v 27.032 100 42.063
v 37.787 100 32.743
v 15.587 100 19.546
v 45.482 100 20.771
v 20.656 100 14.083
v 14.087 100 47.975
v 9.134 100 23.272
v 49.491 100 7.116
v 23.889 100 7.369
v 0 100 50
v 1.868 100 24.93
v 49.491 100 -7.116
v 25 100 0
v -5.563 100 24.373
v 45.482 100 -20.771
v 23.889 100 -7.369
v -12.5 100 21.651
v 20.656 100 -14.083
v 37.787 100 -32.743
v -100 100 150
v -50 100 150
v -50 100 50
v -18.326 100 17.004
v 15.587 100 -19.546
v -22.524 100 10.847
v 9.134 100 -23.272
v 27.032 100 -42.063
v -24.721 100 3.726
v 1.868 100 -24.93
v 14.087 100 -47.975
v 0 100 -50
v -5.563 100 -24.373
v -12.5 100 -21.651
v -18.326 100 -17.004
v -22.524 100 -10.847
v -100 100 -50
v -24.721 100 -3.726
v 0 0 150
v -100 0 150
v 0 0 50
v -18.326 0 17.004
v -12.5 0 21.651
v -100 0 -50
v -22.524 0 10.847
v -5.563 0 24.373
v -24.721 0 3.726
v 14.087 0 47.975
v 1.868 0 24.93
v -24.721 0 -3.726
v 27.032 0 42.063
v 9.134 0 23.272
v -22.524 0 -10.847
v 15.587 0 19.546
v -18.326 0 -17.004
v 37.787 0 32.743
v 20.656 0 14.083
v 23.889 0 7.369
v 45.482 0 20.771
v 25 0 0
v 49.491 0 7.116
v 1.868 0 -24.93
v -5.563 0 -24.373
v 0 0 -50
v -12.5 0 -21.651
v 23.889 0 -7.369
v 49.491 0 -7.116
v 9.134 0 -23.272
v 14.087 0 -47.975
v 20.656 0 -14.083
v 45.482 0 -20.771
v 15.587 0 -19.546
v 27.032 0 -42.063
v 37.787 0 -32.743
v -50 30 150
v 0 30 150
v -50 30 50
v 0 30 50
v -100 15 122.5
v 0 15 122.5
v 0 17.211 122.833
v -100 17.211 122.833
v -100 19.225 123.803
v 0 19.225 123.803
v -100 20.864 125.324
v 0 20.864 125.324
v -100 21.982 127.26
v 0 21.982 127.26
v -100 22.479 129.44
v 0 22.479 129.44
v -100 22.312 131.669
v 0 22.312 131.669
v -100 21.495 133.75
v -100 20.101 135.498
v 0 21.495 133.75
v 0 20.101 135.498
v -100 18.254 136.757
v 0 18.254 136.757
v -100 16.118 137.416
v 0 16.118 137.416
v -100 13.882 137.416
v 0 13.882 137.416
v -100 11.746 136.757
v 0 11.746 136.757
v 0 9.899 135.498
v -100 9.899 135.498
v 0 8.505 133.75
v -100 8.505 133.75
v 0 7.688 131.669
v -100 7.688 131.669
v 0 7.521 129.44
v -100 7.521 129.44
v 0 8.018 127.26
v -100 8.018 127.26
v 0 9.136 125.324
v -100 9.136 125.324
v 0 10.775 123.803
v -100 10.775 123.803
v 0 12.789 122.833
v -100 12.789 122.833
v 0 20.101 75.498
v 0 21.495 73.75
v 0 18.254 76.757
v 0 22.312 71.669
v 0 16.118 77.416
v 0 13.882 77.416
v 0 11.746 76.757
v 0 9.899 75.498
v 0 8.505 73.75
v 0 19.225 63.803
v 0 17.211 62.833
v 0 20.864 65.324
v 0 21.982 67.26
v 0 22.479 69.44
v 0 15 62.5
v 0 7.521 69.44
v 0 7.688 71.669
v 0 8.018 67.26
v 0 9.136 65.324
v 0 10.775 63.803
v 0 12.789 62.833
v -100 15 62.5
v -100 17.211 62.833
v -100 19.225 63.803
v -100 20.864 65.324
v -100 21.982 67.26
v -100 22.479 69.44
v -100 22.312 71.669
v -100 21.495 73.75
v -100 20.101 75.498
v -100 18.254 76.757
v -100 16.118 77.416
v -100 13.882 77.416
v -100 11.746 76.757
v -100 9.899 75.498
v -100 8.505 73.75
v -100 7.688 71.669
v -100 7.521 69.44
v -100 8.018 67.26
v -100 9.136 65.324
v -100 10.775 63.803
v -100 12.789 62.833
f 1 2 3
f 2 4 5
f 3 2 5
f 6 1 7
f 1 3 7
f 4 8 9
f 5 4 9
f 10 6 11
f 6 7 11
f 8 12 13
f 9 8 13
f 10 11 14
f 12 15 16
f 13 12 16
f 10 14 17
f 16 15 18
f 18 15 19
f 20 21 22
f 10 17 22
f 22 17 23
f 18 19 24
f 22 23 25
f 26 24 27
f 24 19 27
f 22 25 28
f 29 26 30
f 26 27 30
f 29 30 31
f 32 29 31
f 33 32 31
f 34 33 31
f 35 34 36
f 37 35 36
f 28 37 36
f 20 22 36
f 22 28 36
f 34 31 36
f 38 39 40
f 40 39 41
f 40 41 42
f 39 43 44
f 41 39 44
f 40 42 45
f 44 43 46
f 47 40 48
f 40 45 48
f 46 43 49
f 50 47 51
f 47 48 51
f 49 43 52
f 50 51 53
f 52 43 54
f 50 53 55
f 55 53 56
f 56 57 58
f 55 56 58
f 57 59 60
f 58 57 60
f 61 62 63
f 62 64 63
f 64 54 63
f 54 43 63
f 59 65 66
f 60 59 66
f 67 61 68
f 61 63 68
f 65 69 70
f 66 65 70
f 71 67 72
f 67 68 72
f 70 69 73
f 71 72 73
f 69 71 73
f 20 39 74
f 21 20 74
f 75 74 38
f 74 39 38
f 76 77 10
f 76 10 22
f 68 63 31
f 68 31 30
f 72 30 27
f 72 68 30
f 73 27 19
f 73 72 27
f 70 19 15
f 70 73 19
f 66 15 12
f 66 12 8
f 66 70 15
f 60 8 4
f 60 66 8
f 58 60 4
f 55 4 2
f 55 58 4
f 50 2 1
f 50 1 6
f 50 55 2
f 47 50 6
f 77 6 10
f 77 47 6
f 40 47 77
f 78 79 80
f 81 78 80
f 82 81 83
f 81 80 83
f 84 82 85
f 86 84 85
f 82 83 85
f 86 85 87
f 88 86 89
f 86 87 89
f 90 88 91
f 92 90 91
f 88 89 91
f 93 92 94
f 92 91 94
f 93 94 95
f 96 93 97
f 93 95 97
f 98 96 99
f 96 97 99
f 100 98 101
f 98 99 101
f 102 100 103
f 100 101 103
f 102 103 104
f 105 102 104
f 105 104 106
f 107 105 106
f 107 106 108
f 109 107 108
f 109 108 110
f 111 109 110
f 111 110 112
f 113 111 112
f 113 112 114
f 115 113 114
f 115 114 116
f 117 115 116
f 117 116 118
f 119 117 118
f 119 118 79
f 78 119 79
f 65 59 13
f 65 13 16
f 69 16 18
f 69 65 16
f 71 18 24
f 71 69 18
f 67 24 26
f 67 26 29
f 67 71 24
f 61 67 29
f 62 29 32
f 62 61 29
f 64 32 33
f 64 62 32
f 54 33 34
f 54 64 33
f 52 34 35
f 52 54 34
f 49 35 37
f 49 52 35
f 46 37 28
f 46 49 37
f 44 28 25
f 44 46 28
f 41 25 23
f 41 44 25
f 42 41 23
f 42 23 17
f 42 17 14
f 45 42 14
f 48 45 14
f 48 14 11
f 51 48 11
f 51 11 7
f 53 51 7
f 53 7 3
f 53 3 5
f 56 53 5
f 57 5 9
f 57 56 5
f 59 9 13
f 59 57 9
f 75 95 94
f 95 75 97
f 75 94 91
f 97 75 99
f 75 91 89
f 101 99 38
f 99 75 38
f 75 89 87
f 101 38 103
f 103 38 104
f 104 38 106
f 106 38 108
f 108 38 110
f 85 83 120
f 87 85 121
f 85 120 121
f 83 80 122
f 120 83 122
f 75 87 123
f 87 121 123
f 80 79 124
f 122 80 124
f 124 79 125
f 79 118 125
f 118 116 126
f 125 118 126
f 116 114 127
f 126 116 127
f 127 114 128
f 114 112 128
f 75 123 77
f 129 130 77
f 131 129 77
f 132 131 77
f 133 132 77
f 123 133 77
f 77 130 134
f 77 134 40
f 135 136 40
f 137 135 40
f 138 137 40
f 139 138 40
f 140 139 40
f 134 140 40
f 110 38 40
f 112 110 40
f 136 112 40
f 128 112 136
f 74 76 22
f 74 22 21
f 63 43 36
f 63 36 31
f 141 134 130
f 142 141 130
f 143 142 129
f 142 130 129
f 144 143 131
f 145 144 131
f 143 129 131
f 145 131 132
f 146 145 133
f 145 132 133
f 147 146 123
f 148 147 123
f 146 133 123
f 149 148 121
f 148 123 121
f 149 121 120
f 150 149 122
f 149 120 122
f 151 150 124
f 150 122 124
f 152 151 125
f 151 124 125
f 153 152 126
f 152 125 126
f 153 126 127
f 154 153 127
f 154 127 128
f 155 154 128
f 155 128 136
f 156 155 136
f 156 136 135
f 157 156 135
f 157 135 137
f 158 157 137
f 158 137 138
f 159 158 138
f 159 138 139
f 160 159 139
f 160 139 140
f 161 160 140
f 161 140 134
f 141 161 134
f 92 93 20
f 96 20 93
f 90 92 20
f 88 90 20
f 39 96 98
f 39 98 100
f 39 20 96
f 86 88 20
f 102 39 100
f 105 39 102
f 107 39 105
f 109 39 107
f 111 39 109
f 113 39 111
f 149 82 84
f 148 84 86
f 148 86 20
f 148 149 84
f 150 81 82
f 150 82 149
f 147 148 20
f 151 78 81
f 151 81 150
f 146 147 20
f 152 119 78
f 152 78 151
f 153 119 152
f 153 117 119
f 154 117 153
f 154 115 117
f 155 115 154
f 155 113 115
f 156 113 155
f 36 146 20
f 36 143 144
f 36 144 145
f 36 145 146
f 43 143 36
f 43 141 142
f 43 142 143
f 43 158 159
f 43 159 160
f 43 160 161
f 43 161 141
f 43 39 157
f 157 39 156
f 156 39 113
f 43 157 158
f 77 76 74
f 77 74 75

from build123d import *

# Parameters (mm, degrees)
CROQUIS3_R              = 25
SALIENTE_EXTRUIR2_DEPTH = 100
CROQUIS3_3_W            = 50
CROQUIS3_3_H            = 100
SALIENTE_EXTRUIR3_DEPTH = 30
CROQUIS4_R              = 7.5
CORTAR_EXTRUIR1_DEPTH   = 207.155281281


with BuildPart() as part:
    # Croquis3 → Saliente-Extruir2 (new body)
    with BuildSketch(Plane(origin=(0, 0, 0), x_dir=(1, 0, 0), z_dir=(0, 1, 0))):
        with BuildLine():
            ThreePointArc((0, -50), (50, 0), (0, 50))
            Line((0, 50), (-100, 50))
            Line((-100, 50), (-100, -150))
            Line((-100, -150), (-50, -150))
            Line((-50, -150), (-50, -50))
            Line((-50, -50), (0, -50))
        make_face()
        Circle(CROQUIS3_R, mode=Mode.SUBTRACT)
    extrude(amount=SALIENTE_EXTRUIR2_DEPTH)

    # Croquis3<3> → Saliente-Extruir3 (add)
    with BuildSketch(Plane(origin=(0, 0, 0), x_dir=(1, 0, 0), z_dir=(0, 1, 0))):
        with Locations((-25, -100)):
            Rectangle(CROQUIS3_3_W, CROQUIS3_3_H)
    extrude(amount=SALIENTE_EXTRUIR3_DEPTH)

    # Croquis4 → Cortar-Extruir1 (cut, through all)
    with BuildSketch(Plane(origin=(0, 0, 0), x_dir=(0, 0, -1), z_dir=(1, 0, 0))):
        with Locations((-130, 15)):
            Circle(CROQUIS4_R)
        with Locations((-70, 15)):
            Circle(CROQUIS4_R)
    extrude(amount=-CORTAR_EXTRUIR1_DEPTH, mode=Mode.SUBTRACT)


solid = part.part
